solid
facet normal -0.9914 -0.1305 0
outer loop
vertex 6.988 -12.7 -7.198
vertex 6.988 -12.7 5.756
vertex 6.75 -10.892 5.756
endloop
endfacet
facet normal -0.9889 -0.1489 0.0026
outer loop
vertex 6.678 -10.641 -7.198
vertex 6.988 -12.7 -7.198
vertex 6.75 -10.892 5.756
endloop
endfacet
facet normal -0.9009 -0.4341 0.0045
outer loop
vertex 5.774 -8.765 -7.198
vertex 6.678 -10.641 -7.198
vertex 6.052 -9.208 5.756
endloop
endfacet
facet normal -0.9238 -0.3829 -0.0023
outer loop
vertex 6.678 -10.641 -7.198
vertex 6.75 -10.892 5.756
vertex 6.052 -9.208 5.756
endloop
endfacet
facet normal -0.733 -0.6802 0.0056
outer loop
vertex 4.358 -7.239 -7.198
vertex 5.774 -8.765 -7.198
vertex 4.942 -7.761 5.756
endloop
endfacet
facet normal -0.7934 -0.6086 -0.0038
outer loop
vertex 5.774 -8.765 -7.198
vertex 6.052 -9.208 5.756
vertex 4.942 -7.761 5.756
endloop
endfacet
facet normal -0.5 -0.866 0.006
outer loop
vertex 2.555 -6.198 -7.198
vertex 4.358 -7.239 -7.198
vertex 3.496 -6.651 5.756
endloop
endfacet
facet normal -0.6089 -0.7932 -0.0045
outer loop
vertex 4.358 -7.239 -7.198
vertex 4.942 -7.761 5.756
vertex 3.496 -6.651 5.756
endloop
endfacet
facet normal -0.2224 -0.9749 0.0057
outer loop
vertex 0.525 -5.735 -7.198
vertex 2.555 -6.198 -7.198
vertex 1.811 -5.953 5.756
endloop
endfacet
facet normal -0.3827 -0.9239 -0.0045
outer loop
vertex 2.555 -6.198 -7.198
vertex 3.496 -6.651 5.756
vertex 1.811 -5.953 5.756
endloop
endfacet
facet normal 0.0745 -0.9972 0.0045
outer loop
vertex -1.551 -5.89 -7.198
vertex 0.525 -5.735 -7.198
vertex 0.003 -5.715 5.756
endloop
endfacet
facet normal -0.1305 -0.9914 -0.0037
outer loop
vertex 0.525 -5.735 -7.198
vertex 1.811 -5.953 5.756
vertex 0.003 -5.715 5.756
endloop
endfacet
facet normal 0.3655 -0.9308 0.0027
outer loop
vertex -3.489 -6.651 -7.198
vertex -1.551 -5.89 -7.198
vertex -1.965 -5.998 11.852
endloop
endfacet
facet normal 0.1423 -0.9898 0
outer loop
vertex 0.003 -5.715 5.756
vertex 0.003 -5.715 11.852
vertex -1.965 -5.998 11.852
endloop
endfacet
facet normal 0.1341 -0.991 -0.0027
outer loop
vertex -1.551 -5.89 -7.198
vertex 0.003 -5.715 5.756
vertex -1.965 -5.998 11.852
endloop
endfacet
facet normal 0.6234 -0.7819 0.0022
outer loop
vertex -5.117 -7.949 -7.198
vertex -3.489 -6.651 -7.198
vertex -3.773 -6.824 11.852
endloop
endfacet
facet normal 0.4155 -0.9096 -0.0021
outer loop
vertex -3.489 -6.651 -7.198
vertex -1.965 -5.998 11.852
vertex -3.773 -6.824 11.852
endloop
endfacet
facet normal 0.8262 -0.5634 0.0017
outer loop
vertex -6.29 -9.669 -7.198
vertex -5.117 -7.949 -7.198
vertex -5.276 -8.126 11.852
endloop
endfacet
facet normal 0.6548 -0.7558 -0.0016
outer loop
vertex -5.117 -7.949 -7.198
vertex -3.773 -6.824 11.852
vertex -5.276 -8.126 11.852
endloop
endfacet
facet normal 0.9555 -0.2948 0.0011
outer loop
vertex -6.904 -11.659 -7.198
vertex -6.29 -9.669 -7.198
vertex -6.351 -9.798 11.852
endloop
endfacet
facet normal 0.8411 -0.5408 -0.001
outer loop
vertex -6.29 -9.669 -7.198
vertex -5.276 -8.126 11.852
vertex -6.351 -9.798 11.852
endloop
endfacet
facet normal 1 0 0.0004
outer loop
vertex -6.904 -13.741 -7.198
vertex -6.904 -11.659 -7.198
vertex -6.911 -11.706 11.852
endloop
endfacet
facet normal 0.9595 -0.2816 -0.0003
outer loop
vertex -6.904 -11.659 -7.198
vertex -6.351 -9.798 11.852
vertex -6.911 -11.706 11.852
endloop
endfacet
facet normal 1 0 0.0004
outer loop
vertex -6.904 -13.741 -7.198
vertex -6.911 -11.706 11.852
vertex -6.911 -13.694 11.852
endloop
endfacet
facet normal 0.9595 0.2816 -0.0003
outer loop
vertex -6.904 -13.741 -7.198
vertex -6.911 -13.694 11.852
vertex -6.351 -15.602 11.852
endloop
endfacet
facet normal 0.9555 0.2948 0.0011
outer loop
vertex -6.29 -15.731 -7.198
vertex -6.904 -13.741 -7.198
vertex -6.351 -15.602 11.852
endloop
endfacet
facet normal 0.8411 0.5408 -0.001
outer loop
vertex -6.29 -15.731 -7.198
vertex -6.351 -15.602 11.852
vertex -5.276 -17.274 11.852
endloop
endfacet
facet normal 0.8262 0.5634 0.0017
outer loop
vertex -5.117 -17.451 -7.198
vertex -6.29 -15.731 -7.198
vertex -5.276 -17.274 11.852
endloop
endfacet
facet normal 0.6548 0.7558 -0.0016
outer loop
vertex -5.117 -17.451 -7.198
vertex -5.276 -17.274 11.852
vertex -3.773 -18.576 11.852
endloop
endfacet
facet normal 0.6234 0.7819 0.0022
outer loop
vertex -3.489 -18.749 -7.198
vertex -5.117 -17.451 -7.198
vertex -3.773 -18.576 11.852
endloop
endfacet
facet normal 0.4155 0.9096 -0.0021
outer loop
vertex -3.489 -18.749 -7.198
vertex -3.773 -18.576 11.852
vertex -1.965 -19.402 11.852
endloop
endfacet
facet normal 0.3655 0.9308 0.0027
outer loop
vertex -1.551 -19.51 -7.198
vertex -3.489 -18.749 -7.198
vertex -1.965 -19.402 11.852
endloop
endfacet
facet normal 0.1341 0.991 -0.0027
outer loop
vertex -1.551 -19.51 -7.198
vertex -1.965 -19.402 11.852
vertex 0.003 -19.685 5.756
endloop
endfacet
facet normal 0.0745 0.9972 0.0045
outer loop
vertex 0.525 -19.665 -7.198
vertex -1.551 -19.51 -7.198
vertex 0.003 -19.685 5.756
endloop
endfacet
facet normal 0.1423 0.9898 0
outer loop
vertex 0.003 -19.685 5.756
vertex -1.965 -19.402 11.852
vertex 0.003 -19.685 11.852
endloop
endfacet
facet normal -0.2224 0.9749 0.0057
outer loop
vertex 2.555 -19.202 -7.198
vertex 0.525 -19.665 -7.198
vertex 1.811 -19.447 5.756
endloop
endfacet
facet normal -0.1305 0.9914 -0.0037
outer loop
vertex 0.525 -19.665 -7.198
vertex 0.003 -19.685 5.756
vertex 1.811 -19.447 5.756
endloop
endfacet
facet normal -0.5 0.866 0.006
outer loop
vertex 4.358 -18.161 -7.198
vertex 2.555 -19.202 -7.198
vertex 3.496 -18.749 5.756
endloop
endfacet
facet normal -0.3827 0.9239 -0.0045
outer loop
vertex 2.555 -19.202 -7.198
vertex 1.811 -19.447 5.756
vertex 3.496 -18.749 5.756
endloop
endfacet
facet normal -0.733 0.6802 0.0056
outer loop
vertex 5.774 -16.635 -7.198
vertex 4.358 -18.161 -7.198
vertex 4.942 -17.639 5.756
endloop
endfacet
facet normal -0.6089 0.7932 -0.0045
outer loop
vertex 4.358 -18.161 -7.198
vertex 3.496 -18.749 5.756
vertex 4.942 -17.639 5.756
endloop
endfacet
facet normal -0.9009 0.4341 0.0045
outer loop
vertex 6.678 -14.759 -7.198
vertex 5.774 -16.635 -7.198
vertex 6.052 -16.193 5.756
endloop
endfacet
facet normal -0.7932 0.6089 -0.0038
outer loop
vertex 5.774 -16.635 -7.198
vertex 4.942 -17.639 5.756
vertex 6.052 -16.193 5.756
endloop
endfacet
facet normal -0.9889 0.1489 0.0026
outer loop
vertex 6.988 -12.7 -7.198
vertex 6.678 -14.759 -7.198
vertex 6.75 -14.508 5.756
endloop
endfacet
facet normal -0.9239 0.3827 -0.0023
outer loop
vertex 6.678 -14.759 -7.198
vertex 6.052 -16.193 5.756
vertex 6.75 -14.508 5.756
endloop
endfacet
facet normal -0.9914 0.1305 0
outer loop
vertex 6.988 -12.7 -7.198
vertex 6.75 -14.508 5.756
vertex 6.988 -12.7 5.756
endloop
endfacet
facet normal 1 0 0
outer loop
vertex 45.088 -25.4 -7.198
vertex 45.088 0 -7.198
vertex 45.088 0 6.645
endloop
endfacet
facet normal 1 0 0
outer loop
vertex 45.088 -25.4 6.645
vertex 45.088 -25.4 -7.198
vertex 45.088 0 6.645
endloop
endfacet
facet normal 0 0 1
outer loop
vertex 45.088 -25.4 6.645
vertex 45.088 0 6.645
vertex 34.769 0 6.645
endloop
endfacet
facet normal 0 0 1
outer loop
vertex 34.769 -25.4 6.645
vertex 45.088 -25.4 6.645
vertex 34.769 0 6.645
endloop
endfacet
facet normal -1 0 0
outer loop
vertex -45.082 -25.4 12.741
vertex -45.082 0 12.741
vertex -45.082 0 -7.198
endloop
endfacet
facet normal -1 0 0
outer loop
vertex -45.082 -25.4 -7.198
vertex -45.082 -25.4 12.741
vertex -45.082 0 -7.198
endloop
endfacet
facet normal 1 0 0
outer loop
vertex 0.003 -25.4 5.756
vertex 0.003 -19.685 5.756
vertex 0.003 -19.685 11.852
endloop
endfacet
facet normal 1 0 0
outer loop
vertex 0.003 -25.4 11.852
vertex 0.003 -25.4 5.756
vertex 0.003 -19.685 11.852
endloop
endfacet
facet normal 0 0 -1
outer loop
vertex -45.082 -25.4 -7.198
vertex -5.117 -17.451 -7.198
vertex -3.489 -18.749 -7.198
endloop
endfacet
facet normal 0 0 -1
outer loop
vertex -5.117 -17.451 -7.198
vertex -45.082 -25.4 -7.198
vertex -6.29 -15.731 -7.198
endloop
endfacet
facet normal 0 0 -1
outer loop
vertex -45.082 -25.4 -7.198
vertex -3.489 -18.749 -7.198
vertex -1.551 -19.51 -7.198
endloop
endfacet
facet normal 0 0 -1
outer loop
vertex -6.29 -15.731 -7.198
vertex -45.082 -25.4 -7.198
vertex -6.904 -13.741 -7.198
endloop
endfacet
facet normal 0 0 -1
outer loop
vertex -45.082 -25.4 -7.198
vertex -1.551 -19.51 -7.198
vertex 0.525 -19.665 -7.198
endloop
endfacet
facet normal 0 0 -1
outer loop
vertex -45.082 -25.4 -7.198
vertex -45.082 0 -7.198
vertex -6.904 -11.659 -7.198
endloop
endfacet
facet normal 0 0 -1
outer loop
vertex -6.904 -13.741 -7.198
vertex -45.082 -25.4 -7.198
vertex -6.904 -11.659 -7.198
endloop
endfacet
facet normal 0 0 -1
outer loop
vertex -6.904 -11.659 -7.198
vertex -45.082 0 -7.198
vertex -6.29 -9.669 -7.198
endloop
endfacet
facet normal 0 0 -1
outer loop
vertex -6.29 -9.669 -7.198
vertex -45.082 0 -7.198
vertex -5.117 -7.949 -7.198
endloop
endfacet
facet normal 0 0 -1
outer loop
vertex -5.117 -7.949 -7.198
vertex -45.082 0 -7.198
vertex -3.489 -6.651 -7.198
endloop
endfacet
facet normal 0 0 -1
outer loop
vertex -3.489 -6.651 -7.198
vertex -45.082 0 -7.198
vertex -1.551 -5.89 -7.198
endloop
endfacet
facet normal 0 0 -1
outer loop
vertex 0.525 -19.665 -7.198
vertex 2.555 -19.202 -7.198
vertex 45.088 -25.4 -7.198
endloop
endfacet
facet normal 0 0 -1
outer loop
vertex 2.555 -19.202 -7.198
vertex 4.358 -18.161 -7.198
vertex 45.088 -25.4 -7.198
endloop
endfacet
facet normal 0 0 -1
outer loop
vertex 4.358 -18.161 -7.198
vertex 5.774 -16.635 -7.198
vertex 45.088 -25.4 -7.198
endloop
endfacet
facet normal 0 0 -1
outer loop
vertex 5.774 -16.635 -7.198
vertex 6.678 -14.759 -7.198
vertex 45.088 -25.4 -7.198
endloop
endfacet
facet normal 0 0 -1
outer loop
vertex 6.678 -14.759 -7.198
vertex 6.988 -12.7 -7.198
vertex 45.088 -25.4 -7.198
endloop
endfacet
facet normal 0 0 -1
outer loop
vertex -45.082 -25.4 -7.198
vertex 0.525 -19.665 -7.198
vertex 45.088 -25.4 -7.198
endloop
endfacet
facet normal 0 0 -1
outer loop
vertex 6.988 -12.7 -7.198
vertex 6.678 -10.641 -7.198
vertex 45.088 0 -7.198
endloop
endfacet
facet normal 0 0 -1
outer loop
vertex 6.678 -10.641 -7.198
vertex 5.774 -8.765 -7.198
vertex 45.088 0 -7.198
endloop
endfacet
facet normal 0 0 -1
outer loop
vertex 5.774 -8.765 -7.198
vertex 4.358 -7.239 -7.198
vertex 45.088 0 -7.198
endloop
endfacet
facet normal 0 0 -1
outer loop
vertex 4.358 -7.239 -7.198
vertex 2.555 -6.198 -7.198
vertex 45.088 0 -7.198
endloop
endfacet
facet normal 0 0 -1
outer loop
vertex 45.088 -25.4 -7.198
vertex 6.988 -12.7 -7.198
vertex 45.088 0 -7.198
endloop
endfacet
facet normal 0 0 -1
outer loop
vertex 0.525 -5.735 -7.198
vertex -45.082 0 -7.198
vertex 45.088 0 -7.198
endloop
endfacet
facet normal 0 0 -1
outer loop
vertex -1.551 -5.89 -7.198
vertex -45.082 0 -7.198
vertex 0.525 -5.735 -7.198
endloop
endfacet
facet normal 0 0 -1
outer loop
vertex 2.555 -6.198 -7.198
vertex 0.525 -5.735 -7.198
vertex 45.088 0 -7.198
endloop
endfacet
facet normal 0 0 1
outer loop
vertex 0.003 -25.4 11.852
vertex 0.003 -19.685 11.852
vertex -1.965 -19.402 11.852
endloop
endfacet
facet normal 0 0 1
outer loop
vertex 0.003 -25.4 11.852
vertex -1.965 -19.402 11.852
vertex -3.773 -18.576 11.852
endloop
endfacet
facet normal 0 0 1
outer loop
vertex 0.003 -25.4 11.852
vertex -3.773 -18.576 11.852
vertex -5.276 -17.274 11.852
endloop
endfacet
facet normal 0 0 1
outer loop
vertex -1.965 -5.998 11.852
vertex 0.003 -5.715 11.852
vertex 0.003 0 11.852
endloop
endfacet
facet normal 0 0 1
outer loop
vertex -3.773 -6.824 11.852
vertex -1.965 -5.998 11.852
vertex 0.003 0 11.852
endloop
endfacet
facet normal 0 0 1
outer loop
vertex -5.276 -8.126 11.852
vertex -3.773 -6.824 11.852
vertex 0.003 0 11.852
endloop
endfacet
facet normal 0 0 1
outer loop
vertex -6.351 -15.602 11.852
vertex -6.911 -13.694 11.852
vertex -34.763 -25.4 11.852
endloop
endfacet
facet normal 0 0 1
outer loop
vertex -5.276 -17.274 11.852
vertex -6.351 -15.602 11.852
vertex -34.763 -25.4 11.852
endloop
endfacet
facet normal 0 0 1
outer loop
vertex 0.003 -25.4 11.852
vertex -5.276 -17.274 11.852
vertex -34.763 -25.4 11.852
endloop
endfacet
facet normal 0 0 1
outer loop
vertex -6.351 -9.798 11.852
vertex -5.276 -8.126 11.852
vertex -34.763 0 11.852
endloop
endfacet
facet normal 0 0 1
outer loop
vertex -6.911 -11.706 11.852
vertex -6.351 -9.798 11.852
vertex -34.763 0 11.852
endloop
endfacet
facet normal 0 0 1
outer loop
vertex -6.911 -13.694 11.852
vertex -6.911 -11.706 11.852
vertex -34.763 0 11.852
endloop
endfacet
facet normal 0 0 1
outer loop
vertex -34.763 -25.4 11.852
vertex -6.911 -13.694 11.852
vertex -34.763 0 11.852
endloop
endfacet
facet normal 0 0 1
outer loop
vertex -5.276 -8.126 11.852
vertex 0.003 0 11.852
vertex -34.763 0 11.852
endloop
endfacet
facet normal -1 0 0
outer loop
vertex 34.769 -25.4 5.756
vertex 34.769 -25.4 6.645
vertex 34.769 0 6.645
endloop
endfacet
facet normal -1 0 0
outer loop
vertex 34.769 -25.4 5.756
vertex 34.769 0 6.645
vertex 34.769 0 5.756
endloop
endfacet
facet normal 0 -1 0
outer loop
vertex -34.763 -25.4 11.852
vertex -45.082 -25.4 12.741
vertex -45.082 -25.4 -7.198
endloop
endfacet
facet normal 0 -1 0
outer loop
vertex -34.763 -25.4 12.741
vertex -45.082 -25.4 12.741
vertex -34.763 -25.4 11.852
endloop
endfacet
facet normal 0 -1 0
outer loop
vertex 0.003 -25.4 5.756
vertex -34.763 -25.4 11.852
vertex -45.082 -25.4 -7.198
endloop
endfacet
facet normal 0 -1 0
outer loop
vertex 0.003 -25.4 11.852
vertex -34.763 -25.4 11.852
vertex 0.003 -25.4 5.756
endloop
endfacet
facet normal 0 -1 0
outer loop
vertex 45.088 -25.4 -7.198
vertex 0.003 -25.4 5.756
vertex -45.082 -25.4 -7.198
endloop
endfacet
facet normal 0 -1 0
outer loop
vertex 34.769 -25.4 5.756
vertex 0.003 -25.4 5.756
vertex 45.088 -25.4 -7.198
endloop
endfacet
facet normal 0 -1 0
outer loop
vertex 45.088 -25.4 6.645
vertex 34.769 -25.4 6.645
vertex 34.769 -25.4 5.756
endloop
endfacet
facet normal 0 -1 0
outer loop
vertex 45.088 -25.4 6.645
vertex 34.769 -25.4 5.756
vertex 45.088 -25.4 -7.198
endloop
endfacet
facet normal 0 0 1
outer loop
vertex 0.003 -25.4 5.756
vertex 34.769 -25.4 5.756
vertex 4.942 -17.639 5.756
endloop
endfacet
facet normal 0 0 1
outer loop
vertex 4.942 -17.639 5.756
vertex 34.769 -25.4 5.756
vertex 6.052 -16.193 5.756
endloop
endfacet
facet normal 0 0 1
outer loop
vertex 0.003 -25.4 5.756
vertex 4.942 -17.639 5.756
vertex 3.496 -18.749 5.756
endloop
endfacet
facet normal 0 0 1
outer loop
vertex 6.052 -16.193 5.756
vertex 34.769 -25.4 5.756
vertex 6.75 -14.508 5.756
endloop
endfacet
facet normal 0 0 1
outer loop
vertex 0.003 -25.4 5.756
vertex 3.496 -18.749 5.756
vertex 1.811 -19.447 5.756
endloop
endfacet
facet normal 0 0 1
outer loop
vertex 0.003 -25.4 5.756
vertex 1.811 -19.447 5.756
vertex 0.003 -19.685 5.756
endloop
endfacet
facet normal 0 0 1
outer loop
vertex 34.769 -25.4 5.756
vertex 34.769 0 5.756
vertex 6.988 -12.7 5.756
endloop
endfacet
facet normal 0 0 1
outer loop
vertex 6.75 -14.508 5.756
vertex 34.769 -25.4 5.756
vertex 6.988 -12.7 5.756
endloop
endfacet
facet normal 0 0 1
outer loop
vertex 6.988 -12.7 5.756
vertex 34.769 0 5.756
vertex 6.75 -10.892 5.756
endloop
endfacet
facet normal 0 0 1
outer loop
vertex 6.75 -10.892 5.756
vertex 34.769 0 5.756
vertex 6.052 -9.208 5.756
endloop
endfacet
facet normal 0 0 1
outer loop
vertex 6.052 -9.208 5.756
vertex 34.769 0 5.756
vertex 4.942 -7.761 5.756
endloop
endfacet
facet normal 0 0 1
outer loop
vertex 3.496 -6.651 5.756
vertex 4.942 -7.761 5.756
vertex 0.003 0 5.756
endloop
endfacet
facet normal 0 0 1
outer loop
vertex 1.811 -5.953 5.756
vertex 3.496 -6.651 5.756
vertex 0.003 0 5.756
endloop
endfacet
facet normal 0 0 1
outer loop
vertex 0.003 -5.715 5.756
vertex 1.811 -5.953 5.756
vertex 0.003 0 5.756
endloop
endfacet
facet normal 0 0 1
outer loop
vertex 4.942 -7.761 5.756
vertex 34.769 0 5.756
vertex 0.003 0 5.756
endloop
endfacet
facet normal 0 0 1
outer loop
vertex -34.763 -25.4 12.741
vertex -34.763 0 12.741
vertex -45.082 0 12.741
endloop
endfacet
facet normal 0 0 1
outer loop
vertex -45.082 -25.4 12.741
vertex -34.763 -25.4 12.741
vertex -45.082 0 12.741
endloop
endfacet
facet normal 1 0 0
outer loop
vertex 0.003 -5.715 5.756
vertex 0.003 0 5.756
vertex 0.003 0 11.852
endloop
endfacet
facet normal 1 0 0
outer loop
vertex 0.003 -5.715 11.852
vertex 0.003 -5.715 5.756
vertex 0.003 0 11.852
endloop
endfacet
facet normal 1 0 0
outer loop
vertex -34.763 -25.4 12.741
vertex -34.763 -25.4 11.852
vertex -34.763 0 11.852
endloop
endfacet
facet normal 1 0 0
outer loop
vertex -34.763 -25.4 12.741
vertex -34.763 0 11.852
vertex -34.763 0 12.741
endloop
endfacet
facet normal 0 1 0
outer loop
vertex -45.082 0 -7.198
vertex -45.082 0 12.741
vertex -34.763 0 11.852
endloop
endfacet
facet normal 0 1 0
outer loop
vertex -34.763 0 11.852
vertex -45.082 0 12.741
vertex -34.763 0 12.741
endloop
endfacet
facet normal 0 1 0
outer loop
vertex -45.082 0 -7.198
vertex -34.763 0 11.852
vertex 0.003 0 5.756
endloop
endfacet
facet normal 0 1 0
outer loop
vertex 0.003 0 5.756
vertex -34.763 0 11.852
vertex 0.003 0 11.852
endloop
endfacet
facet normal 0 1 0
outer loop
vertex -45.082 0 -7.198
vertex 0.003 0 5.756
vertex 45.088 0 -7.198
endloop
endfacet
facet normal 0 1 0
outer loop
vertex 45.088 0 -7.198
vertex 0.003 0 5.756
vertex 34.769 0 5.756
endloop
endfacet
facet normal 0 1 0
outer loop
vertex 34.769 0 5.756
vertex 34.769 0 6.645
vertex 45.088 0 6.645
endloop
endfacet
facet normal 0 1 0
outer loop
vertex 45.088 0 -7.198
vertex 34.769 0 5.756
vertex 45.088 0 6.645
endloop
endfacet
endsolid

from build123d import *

# Parameters (mm, degrees)
F1_DEPTH = 25.4
F2_R     = 6.985
F3_DEPTH = 25.4


with BuildPart() as f1:
    # F0 (on Front) → F1 (new body)
    with BuildSketch(Plane.XZ):
        Polygon((-34.763229, 12.741052), (-45.081979, 12.741052), (-45.081979, -7.197948), (45.088021, -7.197948), (45.088021, 5.756052), (45.088021, 6.645052), (34.769271, 6.645052), (34.769271, 5.756052), (0.003021, 5.756052), (0.003021, 11.852052), (-34.763229, 11.852052), align=None)
    extrude(amount=F1_DEPTH)

    # F2 (on face) → F3 (cut)
    with BuildSketch(Plane.XY.offset(11.852052)):
        with Locations((0.003021, -12.7)):
            Circle(F2_R)
    extrude(amount=-F3_DEPTH, mode=Mode.SUBTRACT)


solid = f1.part
